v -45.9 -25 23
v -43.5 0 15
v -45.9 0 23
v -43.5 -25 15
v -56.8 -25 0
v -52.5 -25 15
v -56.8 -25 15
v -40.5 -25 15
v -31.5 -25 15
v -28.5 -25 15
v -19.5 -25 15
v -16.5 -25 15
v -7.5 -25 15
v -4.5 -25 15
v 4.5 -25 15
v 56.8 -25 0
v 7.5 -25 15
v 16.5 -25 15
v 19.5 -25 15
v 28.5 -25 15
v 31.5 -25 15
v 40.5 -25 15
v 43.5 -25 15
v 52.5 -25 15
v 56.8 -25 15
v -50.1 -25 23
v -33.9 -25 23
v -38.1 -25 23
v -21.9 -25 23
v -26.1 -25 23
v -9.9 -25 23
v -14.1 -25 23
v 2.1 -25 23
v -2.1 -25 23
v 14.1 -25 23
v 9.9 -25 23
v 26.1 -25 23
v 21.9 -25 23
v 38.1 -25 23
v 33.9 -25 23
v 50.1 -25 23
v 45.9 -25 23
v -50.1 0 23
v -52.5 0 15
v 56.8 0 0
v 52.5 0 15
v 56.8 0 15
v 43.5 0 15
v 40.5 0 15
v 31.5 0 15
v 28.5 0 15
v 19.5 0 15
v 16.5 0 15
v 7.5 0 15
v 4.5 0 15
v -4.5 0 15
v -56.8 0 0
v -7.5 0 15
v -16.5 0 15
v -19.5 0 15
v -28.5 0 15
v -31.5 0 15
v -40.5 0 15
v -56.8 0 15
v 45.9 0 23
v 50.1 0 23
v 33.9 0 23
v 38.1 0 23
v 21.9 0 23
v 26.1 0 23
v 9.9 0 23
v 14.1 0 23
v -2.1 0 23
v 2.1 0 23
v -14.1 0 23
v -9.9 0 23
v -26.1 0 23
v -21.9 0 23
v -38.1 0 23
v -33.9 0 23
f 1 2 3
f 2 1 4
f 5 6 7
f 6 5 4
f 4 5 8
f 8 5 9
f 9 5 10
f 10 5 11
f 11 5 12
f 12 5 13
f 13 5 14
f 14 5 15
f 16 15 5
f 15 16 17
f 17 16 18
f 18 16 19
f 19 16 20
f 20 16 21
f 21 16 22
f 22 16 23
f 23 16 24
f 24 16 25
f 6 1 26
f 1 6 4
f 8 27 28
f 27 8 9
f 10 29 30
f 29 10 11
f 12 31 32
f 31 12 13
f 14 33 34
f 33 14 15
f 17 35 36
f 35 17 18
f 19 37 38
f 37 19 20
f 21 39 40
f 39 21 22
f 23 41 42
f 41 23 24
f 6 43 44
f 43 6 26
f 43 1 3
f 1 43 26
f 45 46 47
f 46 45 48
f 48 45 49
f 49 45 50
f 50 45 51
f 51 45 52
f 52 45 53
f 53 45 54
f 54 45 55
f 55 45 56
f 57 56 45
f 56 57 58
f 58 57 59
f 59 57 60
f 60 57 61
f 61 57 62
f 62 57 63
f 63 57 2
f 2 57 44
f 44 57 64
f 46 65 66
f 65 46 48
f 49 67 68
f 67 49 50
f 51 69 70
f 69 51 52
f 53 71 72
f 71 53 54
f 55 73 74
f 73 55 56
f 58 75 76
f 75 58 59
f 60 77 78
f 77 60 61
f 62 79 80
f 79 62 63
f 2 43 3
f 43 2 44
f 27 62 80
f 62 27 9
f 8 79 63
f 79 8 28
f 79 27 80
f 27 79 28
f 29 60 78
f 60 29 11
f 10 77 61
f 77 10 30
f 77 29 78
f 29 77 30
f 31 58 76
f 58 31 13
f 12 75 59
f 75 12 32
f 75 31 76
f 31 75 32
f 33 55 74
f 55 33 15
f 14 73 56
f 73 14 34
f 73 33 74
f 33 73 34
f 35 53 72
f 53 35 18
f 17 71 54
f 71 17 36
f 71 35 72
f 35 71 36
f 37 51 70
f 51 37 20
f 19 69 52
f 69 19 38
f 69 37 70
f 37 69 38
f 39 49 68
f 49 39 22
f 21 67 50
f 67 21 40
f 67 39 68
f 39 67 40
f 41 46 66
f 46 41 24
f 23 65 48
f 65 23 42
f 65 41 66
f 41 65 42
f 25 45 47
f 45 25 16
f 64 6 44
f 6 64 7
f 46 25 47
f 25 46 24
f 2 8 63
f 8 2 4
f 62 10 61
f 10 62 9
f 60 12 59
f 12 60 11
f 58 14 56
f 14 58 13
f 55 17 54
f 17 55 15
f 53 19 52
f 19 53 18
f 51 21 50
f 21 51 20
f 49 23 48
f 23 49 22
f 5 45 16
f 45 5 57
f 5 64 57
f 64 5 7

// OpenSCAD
$fn = 32;

// ----------------------------------------------------------------------
// Toothed rack, 9 teeth
// 12 mm pitch, 8 mm teeth
// ----------------------------------------------------------------------

// --- parameters (mm) ---
bar_w = 25;     // bar width (Y)
bar_h = 15;     // bar height (Z)
teeth = 9;      // number of teeth
pitch = 12;     // tooth pitch
tooth_h = 8;    // tooth height above the bar
root_w = 9.6;   // tooth width at the root
crest_w = 4.2;  // tooth width at the crest

// --- derived feature positions (mm) ---
span = (teeth - 1) * pitch;  // = 96   distance between the outer teeth
bar_l = span + root_w + 8;   // = 113.6   bar length: teeth plus 4 mm at each end
tooth_x = -span / 2;         // = -48   X of the first tooth
height = bar_h + tooth_h;    // = 23   overall height
feature_centers = [
  [tooth_x + 0 * pitch, -bar_w / 2],
  [tooth_x + 1 * pitch, -bar_w / 2],
  [tooth_x + 2 * pitch, -bar_w / 2],
  [tooth_x + 3 * pitch, -bar_w / 2],
  [tooth_x + 4 * pitch, -bar_w / 2],
  [tooth_x + 5 * pitch, -bar_w / 2],
  [tooth_x + 6 * pitch, -bar_w / 2],
  [tooth_x + 7 * pitch, -bar_w / 2],
  [tooth_x + 8 * pitch, -bar_w / 2]
];   // tooth centre line, drives the tooth loop

// bar with a rack of teeth, one extruded trapezoium per centre
module rack_tooth() {
  linear_extrude(height = bar_w)
    polygon(points = [
      [0, 0],
      [root_w, 0],
      [root_w / 2 + crest_w / 2, tooth_h + 1],
      [root_w / 2 - crest_w / 2, tooth_h + 1]
    ]);
}

union() {
  translate([-bar_l / 2, -bar_w, 0]) cube([bar_l, bar_w, bar_h]);
  for (centre = feature_centers)
    translate([centre[0] - root_w / 2, 0, bar_h - 1]) rotate([90, 0, 0]) rack_tooth();
}
